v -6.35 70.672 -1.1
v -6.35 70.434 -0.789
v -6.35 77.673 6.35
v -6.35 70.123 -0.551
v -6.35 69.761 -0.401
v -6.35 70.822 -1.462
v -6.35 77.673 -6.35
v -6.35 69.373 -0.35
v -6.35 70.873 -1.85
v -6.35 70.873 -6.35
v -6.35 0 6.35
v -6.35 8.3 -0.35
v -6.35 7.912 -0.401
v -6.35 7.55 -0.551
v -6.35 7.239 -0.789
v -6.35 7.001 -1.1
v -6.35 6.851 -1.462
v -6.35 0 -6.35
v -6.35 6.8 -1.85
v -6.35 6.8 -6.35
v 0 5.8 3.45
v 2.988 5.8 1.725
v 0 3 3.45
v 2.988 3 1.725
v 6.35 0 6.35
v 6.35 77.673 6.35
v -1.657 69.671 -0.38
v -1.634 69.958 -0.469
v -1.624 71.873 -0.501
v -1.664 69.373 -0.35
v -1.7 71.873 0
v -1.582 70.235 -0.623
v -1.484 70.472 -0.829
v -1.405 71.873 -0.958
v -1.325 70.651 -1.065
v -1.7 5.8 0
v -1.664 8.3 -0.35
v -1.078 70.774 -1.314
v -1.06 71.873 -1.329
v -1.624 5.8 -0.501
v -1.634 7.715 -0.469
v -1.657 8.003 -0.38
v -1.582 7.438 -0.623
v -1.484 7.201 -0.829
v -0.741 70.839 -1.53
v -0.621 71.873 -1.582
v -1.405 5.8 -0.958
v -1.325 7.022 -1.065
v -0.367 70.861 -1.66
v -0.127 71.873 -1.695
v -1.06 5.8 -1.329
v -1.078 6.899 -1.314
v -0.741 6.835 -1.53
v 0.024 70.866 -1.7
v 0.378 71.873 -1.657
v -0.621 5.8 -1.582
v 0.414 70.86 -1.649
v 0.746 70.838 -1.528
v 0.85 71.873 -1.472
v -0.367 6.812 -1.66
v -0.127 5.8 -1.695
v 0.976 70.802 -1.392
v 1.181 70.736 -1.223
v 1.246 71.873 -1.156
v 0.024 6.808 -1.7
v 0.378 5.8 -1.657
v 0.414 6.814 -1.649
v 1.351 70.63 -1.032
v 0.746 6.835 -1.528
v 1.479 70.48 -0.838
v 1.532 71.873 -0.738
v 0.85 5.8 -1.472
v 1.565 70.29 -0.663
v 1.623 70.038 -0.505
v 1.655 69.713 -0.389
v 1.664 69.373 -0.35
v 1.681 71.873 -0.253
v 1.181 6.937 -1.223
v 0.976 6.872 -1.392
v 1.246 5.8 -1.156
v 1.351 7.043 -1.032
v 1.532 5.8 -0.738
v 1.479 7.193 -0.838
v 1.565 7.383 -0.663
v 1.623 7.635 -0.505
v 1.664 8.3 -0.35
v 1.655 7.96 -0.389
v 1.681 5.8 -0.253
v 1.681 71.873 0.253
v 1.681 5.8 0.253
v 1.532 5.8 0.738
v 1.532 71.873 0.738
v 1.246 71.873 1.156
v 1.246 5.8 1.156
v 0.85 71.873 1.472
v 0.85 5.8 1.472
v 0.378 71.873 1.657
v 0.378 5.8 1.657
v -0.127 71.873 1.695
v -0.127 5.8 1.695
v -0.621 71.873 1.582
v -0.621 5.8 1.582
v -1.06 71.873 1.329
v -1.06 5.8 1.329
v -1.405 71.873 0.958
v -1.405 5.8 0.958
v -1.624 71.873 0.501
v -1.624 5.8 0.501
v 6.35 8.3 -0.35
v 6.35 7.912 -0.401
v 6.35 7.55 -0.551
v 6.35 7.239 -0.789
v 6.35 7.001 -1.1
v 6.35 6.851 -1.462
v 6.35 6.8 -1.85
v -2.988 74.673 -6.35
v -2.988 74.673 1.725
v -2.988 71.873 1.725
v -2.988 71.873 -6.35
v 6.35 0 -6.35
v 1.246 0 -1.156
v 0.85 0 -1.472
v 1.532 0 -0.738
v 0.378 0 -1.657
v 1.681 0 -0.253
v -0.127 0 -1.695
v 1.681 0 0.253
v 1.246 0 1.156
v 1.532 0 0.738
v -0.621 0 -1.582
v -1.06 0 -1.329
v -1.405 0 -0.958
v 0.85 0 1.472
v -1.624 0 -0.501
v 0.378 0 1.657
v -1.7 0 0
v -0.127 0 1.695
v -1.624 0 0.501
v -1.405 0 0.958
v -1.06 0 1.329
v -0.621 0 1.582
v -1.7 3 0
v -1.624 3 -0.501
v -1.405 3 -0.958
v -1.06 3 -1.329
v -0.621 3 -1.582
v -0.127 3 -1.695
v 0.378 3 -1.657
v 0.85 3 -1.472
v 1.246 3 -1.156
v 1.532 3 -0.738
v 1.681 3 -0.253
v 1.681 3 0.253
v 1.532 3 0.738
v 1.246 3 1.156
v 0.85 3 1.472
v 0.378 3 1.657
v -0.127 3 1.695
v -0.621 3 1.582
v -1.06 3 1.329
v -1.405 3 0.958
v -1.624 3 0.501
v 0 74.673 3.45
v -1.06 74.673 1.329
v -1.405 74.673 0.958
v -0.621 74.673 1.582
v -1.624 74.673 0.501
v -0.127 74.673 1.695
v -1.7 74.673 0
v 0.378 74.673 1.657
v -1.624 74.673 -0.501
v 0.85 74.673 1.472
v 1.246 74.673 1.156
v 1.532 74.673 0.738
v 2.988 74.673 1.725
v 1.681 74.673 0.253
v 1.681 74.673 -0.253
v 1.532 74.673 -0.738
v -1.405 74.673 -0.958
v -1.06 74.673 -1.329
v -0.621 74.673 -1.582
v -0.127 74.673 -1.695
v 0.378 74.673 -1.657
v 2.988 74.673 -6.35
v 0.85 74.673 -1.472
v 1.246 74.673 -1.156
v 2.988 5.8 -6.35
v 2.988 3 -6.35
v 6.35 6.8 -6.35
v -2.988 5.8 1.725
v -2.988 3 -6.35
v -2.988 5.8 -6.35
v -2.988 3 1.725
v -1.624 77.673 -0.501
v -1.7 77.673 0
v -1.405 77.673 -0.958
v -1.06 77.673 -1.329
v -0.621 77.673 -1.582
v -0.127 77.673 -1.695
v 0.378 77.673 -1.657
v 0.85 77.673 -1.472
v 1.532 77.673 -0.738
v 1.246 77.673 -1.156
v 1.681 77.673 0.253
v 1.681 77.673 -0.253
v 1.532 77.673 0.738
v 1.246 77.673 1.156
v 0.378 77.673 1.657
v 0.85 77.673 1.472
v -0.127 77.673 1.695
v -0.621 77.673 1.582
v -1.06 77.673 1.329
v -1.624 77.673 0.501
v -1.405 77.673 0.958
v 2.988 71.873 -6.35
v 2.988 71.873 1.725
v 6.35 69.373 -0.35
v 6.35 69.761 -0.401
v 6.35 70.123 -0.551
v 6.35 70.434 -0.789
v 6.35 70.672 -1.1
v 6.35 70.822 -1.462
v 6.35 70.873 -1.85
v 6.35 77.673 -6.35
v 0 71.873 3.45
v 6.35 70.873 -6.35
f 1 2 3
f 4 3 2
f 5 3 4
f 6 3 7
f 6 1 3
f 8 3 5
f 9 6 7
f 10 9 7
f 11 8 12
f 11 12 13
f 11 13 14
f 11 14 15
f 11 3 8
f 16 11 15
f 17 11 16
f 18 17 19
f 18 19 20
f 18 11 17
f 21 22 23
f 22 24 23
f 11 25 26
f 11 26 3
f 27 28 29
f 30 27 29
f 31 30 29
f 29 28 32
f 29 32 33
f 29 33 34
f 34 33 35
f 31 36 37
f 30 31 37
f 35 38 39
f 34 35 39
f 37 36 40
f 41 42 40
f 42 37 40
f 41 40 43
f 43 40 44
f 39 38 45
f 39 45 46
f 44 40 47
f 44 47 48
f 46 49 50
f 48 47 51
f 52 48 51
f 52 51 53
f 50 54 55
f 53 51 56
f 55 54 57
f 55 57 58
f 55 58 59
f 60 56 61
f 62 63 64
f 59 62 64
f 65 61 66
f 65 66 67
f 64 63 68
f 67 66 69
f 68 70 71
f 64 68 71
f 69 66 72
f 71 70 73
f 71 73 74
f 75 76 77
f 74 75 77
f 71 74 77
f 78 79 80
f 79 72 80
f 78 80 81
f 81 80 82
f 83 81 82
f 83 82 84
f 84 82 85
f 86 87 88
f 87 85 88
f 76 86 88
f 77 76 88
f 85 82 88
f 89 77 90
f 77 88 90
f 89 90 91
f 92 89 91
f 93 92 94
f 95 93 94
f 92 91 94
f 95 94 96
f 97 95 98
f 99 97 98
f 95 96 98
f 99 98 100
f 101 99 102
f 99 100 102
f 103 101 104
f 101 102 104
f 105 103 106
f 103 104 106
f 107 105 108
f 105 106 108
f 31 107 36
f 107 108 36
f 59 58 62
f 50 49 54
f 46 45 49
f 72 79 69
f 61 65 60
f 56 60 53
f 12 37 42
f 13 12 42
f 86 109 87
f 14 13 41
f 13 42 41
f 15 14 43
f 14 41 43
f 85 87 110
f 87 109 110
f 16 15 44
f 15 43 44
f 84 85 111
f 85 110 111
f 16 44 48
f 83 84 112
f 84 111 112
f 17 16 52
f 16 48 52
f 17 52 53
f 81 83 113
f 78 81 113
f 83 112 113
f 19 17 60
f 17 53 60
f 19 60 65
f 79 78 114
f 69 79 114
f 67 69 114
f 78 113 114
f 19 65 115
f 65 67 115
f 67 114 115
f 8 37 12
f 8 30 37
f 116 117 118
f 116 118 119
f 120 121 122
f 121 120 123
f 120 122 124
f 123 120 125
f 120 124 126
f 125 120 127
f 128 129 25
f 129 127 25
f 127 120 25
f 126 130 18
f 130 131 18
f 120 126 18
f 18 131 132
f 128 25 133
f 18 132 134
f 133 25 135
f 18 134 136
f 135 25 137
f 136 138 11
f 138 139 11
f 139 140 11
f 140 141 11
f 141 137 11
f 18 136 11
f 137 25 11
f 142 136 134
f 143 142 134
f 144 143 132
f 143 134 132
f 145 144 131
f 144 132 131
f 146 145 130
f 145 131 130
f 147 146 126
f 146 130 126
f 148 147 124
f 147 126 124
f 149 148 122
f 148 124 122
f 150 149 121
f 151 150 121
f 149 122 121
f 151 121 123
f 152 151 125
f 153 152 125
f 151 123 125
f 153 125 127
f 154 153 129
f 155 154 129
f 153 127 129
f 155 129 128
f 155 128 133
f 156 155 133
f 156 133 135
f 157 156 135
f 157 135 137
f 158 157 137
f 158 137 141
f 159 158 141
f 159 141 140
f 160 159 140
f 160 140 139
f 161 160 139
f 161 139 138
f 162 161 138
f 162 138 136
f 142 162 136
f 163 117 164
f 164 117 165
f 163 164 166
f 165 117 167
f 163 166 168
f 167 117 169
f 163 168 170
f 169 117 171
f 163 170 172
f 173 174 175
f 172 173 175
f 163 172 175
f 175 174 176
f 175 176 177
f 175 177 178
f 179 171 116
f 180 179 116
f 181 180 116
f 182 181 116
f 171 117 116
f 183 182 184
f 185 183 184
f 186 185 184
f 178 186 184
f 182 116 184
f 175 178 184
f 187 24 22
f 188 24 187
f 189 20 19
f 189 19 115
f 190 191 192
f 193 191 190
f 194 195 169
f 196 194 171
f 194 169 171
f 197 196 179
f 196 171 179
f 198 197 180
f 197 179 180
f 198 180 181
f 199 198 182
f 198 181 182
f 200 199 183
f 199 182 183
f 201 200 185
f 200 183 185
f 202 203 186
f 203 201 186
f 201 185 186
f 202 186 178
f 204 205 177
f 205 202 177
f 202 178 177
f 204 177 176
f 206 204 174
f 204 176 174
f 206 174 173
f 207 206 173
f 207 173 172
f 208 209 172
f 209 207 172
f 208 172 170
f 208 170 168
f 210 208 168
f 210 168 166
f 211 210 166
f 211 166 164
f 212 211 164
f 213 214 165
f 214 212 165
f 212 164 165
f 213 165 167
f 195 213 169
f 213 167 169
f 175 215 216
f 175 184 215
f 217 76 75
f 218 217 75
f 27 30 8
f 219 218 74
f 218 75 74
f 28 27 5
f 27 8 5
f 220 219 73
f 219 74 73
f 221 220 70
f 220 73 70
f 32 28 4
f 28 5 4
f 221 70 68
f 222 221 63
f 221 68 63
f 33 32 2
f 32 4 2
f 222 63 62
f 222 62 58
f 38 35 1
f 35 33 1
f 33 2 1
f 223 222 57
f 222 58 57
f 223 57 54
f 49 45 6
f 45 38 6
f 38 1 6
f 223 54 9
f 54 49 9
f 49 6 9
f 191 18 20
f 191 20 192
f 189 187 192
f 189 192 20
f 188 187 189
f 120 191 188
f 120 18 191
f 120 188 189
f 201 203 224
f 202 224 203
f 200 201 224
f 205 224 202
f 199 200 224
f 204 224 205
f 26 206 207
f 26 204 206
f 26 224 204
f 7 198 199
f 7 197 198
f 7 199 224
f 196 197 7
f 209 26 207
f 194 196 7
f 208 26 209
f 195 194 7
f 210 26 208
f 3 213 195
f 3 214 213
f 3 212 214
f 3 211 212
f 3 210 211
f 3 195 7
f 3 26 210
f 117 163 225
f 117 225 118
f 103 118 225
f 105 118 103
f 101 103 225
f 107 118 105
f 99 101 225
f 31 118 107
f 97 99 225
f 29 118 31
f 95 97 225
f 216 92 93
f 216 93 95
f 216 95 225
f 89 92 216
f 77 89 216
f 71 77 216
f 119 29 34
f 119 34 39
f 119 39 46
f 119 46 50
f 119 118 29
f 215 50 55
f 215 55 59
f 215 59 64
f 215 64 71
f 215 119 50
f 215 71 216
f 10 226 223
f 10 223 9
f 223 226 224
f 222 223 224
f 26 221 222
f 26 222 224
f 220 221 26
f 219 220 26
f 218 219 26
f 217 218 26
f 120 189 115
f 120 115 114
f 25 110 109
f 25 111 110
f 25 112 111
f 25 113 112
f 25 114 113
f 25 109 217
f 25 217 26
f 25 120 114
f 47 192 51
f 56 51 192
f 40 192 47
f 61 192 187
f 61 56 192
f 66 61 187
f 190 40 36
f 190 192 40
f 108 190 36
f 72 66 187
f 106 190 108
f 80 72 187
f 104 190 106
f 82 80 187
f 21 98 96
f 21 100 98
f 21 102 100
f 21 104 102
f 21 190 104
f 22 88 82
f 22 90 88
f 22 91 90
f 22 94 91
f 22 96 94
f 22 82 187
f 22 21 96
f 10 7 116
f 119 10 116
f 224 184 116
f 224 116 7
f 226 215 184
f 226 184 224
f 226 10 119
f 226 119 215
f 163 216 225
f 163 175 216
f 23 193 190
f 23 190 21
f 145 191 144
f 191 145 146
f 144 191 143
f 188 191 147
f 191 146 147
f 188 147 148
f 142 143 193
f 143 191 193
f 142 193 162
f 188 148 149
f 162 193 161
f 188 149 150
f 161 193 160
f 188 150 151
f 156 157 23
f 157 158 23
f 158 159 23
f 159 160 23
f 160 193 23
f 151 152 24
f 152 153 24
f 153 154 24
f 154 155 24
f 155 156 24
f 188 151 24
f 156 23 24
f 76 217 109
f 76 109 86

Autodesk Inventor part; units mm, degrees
ref_plane "YZ Plane" through (0, 0, 0) normal (1, 0, 0) x (0, 1, 0)
ref_plane "XZ Plane" through (0, 0, 0) normal (0, 1, 0) x (-1, 0, 0)
ref_plane "XY Plane" through (0, 0, 0) normal (0, 0, 1) x (1, 0, 0)
sketch "Sketch1" plane through (0, 0, 0) normal (0, 1, 0) x (-1, 0, 0)
  line L0 (-6.35, 6.35) -> (6.35, 6.35)
  line L1 (6.35, 6.35) -> (6.35, -6.35)
  line L2 (6.35, -6.35) -> (-6.35, -6.35)
  line L3 (-6.35, -6.35) -> (-6.35, 6.35)
  line L4 (-6.35, 6.35) -> (6.35, -6.35) construction
  line L5 (6.35, 6.35) -> (-6.35, -6.35) construction
  circle A0 centre (0, 0) radius 1.7
  dimension "d0" = 12.7
  dimension "d1" = 12.7
  dimension "d2" = 3.4
extrude "Extrusion1" add sketch "Sketch1" along normal blind 77.6732
ref_plane "Work Plane1" through (0, 74.6732, 0) normal (0, 1, 0) x (1, 0, 0)
sketch "Sketch2" plane through (0, 74.6732, 0) normal (0, 1, 0) x (1, 0, 0)
  circle A0 centre (0, 0) radius 1.7 construction
  circle A1 centre (0, 0) radius 3.45 construction
  line L0 (0, -3.45) -> (-2.9878, -1.725)
  line L1 (-2.9878, -1.725) -> (-2.9878, 6.35)
  line L2 (2.9878, 6.35) -> (2.9878, -1.725)
  line L3 (2.9878, -1.725) -> (0, -3.45)
  line L4 (6.35, 6.35) -> (-6.35, 6.35) projected
  line L5 (-2.9878, 6.35) -> (2.9878, 6.35)
  dimension "d6" = 6.9
extrude "Extrusion2" cut sketch "Sketch2" against normal blind 2.8
ref_plane "Work Plane2" through (0, 3, 0) normal (0, -1, 0) x (1, 0, 0)
sketch "Sketch3" plane through (0, 3, 0) normal (0, -1, 0) x (1, 0, 0)
  circle A0 centre (0, 0) radius 3.45 construction
  line L0 (2.9878, 1.725) -> (0, 3.45) projected
  line L1 (0, 3.45) -> (2.9878, 1.725)
  line L2 (2.9878, 1.725) -> (2.9878, -6.35)
  line L3 (-2.9878, -6.35) -> (-2.9878, 1.725)
  line L4 (-2.9878, 1.725) -> (0, 3.45)
  line L5 (6.35, -6.35) -> (-6.35, -6.35) projected
  line L6 (-2.9878, -6.35) -> (2.9878, -6.35)
  point P0 (2.9878, 1.725)
  dimension "d10" = 6.9
extrude "Extrusion3" cut sketch "Sketch3" against normal blind 2.8
sketch "Sketch4" plane through (6.35, 0, -6.35) normal (0, 0, -1) x (-1, 0, 0)
  line L0 (0, 0) -> (0, 77.6732) projected
  line L1 (12.7, 6.8) -> (0, 6.8)
  line L2 (0, 6.8) -> (0, 70.8732)
  line L3 (0, 70.8732) -> (12.7, 70.8732)
  line L4 (12.7, 70.8732) -> (12.7, 6.8)
  line L5 (9.3378, 71.8732) -> (3.3622, 71.8732) projected
  line L6 (3.3622, 5.8) -> (9.3378, 5.8) projected
  point P0 (6.35, 0)
  point P1 (0, 6.8)
  dimension "d13" = 1
  dimension "d14" = 1
extrude "Extrusion4" cut sketch "Sketch4" against normal blind 6
fillet "Fillet1" radius 1.5 4 edges at (4.0068, 6.8, -0.35) (-4.0068, 6.8, -0.35) (4.0068, 70.8732, -0.35) (-4.0068, 70.8732, -0.35)
properties part number "standoff for walls near wheel"
